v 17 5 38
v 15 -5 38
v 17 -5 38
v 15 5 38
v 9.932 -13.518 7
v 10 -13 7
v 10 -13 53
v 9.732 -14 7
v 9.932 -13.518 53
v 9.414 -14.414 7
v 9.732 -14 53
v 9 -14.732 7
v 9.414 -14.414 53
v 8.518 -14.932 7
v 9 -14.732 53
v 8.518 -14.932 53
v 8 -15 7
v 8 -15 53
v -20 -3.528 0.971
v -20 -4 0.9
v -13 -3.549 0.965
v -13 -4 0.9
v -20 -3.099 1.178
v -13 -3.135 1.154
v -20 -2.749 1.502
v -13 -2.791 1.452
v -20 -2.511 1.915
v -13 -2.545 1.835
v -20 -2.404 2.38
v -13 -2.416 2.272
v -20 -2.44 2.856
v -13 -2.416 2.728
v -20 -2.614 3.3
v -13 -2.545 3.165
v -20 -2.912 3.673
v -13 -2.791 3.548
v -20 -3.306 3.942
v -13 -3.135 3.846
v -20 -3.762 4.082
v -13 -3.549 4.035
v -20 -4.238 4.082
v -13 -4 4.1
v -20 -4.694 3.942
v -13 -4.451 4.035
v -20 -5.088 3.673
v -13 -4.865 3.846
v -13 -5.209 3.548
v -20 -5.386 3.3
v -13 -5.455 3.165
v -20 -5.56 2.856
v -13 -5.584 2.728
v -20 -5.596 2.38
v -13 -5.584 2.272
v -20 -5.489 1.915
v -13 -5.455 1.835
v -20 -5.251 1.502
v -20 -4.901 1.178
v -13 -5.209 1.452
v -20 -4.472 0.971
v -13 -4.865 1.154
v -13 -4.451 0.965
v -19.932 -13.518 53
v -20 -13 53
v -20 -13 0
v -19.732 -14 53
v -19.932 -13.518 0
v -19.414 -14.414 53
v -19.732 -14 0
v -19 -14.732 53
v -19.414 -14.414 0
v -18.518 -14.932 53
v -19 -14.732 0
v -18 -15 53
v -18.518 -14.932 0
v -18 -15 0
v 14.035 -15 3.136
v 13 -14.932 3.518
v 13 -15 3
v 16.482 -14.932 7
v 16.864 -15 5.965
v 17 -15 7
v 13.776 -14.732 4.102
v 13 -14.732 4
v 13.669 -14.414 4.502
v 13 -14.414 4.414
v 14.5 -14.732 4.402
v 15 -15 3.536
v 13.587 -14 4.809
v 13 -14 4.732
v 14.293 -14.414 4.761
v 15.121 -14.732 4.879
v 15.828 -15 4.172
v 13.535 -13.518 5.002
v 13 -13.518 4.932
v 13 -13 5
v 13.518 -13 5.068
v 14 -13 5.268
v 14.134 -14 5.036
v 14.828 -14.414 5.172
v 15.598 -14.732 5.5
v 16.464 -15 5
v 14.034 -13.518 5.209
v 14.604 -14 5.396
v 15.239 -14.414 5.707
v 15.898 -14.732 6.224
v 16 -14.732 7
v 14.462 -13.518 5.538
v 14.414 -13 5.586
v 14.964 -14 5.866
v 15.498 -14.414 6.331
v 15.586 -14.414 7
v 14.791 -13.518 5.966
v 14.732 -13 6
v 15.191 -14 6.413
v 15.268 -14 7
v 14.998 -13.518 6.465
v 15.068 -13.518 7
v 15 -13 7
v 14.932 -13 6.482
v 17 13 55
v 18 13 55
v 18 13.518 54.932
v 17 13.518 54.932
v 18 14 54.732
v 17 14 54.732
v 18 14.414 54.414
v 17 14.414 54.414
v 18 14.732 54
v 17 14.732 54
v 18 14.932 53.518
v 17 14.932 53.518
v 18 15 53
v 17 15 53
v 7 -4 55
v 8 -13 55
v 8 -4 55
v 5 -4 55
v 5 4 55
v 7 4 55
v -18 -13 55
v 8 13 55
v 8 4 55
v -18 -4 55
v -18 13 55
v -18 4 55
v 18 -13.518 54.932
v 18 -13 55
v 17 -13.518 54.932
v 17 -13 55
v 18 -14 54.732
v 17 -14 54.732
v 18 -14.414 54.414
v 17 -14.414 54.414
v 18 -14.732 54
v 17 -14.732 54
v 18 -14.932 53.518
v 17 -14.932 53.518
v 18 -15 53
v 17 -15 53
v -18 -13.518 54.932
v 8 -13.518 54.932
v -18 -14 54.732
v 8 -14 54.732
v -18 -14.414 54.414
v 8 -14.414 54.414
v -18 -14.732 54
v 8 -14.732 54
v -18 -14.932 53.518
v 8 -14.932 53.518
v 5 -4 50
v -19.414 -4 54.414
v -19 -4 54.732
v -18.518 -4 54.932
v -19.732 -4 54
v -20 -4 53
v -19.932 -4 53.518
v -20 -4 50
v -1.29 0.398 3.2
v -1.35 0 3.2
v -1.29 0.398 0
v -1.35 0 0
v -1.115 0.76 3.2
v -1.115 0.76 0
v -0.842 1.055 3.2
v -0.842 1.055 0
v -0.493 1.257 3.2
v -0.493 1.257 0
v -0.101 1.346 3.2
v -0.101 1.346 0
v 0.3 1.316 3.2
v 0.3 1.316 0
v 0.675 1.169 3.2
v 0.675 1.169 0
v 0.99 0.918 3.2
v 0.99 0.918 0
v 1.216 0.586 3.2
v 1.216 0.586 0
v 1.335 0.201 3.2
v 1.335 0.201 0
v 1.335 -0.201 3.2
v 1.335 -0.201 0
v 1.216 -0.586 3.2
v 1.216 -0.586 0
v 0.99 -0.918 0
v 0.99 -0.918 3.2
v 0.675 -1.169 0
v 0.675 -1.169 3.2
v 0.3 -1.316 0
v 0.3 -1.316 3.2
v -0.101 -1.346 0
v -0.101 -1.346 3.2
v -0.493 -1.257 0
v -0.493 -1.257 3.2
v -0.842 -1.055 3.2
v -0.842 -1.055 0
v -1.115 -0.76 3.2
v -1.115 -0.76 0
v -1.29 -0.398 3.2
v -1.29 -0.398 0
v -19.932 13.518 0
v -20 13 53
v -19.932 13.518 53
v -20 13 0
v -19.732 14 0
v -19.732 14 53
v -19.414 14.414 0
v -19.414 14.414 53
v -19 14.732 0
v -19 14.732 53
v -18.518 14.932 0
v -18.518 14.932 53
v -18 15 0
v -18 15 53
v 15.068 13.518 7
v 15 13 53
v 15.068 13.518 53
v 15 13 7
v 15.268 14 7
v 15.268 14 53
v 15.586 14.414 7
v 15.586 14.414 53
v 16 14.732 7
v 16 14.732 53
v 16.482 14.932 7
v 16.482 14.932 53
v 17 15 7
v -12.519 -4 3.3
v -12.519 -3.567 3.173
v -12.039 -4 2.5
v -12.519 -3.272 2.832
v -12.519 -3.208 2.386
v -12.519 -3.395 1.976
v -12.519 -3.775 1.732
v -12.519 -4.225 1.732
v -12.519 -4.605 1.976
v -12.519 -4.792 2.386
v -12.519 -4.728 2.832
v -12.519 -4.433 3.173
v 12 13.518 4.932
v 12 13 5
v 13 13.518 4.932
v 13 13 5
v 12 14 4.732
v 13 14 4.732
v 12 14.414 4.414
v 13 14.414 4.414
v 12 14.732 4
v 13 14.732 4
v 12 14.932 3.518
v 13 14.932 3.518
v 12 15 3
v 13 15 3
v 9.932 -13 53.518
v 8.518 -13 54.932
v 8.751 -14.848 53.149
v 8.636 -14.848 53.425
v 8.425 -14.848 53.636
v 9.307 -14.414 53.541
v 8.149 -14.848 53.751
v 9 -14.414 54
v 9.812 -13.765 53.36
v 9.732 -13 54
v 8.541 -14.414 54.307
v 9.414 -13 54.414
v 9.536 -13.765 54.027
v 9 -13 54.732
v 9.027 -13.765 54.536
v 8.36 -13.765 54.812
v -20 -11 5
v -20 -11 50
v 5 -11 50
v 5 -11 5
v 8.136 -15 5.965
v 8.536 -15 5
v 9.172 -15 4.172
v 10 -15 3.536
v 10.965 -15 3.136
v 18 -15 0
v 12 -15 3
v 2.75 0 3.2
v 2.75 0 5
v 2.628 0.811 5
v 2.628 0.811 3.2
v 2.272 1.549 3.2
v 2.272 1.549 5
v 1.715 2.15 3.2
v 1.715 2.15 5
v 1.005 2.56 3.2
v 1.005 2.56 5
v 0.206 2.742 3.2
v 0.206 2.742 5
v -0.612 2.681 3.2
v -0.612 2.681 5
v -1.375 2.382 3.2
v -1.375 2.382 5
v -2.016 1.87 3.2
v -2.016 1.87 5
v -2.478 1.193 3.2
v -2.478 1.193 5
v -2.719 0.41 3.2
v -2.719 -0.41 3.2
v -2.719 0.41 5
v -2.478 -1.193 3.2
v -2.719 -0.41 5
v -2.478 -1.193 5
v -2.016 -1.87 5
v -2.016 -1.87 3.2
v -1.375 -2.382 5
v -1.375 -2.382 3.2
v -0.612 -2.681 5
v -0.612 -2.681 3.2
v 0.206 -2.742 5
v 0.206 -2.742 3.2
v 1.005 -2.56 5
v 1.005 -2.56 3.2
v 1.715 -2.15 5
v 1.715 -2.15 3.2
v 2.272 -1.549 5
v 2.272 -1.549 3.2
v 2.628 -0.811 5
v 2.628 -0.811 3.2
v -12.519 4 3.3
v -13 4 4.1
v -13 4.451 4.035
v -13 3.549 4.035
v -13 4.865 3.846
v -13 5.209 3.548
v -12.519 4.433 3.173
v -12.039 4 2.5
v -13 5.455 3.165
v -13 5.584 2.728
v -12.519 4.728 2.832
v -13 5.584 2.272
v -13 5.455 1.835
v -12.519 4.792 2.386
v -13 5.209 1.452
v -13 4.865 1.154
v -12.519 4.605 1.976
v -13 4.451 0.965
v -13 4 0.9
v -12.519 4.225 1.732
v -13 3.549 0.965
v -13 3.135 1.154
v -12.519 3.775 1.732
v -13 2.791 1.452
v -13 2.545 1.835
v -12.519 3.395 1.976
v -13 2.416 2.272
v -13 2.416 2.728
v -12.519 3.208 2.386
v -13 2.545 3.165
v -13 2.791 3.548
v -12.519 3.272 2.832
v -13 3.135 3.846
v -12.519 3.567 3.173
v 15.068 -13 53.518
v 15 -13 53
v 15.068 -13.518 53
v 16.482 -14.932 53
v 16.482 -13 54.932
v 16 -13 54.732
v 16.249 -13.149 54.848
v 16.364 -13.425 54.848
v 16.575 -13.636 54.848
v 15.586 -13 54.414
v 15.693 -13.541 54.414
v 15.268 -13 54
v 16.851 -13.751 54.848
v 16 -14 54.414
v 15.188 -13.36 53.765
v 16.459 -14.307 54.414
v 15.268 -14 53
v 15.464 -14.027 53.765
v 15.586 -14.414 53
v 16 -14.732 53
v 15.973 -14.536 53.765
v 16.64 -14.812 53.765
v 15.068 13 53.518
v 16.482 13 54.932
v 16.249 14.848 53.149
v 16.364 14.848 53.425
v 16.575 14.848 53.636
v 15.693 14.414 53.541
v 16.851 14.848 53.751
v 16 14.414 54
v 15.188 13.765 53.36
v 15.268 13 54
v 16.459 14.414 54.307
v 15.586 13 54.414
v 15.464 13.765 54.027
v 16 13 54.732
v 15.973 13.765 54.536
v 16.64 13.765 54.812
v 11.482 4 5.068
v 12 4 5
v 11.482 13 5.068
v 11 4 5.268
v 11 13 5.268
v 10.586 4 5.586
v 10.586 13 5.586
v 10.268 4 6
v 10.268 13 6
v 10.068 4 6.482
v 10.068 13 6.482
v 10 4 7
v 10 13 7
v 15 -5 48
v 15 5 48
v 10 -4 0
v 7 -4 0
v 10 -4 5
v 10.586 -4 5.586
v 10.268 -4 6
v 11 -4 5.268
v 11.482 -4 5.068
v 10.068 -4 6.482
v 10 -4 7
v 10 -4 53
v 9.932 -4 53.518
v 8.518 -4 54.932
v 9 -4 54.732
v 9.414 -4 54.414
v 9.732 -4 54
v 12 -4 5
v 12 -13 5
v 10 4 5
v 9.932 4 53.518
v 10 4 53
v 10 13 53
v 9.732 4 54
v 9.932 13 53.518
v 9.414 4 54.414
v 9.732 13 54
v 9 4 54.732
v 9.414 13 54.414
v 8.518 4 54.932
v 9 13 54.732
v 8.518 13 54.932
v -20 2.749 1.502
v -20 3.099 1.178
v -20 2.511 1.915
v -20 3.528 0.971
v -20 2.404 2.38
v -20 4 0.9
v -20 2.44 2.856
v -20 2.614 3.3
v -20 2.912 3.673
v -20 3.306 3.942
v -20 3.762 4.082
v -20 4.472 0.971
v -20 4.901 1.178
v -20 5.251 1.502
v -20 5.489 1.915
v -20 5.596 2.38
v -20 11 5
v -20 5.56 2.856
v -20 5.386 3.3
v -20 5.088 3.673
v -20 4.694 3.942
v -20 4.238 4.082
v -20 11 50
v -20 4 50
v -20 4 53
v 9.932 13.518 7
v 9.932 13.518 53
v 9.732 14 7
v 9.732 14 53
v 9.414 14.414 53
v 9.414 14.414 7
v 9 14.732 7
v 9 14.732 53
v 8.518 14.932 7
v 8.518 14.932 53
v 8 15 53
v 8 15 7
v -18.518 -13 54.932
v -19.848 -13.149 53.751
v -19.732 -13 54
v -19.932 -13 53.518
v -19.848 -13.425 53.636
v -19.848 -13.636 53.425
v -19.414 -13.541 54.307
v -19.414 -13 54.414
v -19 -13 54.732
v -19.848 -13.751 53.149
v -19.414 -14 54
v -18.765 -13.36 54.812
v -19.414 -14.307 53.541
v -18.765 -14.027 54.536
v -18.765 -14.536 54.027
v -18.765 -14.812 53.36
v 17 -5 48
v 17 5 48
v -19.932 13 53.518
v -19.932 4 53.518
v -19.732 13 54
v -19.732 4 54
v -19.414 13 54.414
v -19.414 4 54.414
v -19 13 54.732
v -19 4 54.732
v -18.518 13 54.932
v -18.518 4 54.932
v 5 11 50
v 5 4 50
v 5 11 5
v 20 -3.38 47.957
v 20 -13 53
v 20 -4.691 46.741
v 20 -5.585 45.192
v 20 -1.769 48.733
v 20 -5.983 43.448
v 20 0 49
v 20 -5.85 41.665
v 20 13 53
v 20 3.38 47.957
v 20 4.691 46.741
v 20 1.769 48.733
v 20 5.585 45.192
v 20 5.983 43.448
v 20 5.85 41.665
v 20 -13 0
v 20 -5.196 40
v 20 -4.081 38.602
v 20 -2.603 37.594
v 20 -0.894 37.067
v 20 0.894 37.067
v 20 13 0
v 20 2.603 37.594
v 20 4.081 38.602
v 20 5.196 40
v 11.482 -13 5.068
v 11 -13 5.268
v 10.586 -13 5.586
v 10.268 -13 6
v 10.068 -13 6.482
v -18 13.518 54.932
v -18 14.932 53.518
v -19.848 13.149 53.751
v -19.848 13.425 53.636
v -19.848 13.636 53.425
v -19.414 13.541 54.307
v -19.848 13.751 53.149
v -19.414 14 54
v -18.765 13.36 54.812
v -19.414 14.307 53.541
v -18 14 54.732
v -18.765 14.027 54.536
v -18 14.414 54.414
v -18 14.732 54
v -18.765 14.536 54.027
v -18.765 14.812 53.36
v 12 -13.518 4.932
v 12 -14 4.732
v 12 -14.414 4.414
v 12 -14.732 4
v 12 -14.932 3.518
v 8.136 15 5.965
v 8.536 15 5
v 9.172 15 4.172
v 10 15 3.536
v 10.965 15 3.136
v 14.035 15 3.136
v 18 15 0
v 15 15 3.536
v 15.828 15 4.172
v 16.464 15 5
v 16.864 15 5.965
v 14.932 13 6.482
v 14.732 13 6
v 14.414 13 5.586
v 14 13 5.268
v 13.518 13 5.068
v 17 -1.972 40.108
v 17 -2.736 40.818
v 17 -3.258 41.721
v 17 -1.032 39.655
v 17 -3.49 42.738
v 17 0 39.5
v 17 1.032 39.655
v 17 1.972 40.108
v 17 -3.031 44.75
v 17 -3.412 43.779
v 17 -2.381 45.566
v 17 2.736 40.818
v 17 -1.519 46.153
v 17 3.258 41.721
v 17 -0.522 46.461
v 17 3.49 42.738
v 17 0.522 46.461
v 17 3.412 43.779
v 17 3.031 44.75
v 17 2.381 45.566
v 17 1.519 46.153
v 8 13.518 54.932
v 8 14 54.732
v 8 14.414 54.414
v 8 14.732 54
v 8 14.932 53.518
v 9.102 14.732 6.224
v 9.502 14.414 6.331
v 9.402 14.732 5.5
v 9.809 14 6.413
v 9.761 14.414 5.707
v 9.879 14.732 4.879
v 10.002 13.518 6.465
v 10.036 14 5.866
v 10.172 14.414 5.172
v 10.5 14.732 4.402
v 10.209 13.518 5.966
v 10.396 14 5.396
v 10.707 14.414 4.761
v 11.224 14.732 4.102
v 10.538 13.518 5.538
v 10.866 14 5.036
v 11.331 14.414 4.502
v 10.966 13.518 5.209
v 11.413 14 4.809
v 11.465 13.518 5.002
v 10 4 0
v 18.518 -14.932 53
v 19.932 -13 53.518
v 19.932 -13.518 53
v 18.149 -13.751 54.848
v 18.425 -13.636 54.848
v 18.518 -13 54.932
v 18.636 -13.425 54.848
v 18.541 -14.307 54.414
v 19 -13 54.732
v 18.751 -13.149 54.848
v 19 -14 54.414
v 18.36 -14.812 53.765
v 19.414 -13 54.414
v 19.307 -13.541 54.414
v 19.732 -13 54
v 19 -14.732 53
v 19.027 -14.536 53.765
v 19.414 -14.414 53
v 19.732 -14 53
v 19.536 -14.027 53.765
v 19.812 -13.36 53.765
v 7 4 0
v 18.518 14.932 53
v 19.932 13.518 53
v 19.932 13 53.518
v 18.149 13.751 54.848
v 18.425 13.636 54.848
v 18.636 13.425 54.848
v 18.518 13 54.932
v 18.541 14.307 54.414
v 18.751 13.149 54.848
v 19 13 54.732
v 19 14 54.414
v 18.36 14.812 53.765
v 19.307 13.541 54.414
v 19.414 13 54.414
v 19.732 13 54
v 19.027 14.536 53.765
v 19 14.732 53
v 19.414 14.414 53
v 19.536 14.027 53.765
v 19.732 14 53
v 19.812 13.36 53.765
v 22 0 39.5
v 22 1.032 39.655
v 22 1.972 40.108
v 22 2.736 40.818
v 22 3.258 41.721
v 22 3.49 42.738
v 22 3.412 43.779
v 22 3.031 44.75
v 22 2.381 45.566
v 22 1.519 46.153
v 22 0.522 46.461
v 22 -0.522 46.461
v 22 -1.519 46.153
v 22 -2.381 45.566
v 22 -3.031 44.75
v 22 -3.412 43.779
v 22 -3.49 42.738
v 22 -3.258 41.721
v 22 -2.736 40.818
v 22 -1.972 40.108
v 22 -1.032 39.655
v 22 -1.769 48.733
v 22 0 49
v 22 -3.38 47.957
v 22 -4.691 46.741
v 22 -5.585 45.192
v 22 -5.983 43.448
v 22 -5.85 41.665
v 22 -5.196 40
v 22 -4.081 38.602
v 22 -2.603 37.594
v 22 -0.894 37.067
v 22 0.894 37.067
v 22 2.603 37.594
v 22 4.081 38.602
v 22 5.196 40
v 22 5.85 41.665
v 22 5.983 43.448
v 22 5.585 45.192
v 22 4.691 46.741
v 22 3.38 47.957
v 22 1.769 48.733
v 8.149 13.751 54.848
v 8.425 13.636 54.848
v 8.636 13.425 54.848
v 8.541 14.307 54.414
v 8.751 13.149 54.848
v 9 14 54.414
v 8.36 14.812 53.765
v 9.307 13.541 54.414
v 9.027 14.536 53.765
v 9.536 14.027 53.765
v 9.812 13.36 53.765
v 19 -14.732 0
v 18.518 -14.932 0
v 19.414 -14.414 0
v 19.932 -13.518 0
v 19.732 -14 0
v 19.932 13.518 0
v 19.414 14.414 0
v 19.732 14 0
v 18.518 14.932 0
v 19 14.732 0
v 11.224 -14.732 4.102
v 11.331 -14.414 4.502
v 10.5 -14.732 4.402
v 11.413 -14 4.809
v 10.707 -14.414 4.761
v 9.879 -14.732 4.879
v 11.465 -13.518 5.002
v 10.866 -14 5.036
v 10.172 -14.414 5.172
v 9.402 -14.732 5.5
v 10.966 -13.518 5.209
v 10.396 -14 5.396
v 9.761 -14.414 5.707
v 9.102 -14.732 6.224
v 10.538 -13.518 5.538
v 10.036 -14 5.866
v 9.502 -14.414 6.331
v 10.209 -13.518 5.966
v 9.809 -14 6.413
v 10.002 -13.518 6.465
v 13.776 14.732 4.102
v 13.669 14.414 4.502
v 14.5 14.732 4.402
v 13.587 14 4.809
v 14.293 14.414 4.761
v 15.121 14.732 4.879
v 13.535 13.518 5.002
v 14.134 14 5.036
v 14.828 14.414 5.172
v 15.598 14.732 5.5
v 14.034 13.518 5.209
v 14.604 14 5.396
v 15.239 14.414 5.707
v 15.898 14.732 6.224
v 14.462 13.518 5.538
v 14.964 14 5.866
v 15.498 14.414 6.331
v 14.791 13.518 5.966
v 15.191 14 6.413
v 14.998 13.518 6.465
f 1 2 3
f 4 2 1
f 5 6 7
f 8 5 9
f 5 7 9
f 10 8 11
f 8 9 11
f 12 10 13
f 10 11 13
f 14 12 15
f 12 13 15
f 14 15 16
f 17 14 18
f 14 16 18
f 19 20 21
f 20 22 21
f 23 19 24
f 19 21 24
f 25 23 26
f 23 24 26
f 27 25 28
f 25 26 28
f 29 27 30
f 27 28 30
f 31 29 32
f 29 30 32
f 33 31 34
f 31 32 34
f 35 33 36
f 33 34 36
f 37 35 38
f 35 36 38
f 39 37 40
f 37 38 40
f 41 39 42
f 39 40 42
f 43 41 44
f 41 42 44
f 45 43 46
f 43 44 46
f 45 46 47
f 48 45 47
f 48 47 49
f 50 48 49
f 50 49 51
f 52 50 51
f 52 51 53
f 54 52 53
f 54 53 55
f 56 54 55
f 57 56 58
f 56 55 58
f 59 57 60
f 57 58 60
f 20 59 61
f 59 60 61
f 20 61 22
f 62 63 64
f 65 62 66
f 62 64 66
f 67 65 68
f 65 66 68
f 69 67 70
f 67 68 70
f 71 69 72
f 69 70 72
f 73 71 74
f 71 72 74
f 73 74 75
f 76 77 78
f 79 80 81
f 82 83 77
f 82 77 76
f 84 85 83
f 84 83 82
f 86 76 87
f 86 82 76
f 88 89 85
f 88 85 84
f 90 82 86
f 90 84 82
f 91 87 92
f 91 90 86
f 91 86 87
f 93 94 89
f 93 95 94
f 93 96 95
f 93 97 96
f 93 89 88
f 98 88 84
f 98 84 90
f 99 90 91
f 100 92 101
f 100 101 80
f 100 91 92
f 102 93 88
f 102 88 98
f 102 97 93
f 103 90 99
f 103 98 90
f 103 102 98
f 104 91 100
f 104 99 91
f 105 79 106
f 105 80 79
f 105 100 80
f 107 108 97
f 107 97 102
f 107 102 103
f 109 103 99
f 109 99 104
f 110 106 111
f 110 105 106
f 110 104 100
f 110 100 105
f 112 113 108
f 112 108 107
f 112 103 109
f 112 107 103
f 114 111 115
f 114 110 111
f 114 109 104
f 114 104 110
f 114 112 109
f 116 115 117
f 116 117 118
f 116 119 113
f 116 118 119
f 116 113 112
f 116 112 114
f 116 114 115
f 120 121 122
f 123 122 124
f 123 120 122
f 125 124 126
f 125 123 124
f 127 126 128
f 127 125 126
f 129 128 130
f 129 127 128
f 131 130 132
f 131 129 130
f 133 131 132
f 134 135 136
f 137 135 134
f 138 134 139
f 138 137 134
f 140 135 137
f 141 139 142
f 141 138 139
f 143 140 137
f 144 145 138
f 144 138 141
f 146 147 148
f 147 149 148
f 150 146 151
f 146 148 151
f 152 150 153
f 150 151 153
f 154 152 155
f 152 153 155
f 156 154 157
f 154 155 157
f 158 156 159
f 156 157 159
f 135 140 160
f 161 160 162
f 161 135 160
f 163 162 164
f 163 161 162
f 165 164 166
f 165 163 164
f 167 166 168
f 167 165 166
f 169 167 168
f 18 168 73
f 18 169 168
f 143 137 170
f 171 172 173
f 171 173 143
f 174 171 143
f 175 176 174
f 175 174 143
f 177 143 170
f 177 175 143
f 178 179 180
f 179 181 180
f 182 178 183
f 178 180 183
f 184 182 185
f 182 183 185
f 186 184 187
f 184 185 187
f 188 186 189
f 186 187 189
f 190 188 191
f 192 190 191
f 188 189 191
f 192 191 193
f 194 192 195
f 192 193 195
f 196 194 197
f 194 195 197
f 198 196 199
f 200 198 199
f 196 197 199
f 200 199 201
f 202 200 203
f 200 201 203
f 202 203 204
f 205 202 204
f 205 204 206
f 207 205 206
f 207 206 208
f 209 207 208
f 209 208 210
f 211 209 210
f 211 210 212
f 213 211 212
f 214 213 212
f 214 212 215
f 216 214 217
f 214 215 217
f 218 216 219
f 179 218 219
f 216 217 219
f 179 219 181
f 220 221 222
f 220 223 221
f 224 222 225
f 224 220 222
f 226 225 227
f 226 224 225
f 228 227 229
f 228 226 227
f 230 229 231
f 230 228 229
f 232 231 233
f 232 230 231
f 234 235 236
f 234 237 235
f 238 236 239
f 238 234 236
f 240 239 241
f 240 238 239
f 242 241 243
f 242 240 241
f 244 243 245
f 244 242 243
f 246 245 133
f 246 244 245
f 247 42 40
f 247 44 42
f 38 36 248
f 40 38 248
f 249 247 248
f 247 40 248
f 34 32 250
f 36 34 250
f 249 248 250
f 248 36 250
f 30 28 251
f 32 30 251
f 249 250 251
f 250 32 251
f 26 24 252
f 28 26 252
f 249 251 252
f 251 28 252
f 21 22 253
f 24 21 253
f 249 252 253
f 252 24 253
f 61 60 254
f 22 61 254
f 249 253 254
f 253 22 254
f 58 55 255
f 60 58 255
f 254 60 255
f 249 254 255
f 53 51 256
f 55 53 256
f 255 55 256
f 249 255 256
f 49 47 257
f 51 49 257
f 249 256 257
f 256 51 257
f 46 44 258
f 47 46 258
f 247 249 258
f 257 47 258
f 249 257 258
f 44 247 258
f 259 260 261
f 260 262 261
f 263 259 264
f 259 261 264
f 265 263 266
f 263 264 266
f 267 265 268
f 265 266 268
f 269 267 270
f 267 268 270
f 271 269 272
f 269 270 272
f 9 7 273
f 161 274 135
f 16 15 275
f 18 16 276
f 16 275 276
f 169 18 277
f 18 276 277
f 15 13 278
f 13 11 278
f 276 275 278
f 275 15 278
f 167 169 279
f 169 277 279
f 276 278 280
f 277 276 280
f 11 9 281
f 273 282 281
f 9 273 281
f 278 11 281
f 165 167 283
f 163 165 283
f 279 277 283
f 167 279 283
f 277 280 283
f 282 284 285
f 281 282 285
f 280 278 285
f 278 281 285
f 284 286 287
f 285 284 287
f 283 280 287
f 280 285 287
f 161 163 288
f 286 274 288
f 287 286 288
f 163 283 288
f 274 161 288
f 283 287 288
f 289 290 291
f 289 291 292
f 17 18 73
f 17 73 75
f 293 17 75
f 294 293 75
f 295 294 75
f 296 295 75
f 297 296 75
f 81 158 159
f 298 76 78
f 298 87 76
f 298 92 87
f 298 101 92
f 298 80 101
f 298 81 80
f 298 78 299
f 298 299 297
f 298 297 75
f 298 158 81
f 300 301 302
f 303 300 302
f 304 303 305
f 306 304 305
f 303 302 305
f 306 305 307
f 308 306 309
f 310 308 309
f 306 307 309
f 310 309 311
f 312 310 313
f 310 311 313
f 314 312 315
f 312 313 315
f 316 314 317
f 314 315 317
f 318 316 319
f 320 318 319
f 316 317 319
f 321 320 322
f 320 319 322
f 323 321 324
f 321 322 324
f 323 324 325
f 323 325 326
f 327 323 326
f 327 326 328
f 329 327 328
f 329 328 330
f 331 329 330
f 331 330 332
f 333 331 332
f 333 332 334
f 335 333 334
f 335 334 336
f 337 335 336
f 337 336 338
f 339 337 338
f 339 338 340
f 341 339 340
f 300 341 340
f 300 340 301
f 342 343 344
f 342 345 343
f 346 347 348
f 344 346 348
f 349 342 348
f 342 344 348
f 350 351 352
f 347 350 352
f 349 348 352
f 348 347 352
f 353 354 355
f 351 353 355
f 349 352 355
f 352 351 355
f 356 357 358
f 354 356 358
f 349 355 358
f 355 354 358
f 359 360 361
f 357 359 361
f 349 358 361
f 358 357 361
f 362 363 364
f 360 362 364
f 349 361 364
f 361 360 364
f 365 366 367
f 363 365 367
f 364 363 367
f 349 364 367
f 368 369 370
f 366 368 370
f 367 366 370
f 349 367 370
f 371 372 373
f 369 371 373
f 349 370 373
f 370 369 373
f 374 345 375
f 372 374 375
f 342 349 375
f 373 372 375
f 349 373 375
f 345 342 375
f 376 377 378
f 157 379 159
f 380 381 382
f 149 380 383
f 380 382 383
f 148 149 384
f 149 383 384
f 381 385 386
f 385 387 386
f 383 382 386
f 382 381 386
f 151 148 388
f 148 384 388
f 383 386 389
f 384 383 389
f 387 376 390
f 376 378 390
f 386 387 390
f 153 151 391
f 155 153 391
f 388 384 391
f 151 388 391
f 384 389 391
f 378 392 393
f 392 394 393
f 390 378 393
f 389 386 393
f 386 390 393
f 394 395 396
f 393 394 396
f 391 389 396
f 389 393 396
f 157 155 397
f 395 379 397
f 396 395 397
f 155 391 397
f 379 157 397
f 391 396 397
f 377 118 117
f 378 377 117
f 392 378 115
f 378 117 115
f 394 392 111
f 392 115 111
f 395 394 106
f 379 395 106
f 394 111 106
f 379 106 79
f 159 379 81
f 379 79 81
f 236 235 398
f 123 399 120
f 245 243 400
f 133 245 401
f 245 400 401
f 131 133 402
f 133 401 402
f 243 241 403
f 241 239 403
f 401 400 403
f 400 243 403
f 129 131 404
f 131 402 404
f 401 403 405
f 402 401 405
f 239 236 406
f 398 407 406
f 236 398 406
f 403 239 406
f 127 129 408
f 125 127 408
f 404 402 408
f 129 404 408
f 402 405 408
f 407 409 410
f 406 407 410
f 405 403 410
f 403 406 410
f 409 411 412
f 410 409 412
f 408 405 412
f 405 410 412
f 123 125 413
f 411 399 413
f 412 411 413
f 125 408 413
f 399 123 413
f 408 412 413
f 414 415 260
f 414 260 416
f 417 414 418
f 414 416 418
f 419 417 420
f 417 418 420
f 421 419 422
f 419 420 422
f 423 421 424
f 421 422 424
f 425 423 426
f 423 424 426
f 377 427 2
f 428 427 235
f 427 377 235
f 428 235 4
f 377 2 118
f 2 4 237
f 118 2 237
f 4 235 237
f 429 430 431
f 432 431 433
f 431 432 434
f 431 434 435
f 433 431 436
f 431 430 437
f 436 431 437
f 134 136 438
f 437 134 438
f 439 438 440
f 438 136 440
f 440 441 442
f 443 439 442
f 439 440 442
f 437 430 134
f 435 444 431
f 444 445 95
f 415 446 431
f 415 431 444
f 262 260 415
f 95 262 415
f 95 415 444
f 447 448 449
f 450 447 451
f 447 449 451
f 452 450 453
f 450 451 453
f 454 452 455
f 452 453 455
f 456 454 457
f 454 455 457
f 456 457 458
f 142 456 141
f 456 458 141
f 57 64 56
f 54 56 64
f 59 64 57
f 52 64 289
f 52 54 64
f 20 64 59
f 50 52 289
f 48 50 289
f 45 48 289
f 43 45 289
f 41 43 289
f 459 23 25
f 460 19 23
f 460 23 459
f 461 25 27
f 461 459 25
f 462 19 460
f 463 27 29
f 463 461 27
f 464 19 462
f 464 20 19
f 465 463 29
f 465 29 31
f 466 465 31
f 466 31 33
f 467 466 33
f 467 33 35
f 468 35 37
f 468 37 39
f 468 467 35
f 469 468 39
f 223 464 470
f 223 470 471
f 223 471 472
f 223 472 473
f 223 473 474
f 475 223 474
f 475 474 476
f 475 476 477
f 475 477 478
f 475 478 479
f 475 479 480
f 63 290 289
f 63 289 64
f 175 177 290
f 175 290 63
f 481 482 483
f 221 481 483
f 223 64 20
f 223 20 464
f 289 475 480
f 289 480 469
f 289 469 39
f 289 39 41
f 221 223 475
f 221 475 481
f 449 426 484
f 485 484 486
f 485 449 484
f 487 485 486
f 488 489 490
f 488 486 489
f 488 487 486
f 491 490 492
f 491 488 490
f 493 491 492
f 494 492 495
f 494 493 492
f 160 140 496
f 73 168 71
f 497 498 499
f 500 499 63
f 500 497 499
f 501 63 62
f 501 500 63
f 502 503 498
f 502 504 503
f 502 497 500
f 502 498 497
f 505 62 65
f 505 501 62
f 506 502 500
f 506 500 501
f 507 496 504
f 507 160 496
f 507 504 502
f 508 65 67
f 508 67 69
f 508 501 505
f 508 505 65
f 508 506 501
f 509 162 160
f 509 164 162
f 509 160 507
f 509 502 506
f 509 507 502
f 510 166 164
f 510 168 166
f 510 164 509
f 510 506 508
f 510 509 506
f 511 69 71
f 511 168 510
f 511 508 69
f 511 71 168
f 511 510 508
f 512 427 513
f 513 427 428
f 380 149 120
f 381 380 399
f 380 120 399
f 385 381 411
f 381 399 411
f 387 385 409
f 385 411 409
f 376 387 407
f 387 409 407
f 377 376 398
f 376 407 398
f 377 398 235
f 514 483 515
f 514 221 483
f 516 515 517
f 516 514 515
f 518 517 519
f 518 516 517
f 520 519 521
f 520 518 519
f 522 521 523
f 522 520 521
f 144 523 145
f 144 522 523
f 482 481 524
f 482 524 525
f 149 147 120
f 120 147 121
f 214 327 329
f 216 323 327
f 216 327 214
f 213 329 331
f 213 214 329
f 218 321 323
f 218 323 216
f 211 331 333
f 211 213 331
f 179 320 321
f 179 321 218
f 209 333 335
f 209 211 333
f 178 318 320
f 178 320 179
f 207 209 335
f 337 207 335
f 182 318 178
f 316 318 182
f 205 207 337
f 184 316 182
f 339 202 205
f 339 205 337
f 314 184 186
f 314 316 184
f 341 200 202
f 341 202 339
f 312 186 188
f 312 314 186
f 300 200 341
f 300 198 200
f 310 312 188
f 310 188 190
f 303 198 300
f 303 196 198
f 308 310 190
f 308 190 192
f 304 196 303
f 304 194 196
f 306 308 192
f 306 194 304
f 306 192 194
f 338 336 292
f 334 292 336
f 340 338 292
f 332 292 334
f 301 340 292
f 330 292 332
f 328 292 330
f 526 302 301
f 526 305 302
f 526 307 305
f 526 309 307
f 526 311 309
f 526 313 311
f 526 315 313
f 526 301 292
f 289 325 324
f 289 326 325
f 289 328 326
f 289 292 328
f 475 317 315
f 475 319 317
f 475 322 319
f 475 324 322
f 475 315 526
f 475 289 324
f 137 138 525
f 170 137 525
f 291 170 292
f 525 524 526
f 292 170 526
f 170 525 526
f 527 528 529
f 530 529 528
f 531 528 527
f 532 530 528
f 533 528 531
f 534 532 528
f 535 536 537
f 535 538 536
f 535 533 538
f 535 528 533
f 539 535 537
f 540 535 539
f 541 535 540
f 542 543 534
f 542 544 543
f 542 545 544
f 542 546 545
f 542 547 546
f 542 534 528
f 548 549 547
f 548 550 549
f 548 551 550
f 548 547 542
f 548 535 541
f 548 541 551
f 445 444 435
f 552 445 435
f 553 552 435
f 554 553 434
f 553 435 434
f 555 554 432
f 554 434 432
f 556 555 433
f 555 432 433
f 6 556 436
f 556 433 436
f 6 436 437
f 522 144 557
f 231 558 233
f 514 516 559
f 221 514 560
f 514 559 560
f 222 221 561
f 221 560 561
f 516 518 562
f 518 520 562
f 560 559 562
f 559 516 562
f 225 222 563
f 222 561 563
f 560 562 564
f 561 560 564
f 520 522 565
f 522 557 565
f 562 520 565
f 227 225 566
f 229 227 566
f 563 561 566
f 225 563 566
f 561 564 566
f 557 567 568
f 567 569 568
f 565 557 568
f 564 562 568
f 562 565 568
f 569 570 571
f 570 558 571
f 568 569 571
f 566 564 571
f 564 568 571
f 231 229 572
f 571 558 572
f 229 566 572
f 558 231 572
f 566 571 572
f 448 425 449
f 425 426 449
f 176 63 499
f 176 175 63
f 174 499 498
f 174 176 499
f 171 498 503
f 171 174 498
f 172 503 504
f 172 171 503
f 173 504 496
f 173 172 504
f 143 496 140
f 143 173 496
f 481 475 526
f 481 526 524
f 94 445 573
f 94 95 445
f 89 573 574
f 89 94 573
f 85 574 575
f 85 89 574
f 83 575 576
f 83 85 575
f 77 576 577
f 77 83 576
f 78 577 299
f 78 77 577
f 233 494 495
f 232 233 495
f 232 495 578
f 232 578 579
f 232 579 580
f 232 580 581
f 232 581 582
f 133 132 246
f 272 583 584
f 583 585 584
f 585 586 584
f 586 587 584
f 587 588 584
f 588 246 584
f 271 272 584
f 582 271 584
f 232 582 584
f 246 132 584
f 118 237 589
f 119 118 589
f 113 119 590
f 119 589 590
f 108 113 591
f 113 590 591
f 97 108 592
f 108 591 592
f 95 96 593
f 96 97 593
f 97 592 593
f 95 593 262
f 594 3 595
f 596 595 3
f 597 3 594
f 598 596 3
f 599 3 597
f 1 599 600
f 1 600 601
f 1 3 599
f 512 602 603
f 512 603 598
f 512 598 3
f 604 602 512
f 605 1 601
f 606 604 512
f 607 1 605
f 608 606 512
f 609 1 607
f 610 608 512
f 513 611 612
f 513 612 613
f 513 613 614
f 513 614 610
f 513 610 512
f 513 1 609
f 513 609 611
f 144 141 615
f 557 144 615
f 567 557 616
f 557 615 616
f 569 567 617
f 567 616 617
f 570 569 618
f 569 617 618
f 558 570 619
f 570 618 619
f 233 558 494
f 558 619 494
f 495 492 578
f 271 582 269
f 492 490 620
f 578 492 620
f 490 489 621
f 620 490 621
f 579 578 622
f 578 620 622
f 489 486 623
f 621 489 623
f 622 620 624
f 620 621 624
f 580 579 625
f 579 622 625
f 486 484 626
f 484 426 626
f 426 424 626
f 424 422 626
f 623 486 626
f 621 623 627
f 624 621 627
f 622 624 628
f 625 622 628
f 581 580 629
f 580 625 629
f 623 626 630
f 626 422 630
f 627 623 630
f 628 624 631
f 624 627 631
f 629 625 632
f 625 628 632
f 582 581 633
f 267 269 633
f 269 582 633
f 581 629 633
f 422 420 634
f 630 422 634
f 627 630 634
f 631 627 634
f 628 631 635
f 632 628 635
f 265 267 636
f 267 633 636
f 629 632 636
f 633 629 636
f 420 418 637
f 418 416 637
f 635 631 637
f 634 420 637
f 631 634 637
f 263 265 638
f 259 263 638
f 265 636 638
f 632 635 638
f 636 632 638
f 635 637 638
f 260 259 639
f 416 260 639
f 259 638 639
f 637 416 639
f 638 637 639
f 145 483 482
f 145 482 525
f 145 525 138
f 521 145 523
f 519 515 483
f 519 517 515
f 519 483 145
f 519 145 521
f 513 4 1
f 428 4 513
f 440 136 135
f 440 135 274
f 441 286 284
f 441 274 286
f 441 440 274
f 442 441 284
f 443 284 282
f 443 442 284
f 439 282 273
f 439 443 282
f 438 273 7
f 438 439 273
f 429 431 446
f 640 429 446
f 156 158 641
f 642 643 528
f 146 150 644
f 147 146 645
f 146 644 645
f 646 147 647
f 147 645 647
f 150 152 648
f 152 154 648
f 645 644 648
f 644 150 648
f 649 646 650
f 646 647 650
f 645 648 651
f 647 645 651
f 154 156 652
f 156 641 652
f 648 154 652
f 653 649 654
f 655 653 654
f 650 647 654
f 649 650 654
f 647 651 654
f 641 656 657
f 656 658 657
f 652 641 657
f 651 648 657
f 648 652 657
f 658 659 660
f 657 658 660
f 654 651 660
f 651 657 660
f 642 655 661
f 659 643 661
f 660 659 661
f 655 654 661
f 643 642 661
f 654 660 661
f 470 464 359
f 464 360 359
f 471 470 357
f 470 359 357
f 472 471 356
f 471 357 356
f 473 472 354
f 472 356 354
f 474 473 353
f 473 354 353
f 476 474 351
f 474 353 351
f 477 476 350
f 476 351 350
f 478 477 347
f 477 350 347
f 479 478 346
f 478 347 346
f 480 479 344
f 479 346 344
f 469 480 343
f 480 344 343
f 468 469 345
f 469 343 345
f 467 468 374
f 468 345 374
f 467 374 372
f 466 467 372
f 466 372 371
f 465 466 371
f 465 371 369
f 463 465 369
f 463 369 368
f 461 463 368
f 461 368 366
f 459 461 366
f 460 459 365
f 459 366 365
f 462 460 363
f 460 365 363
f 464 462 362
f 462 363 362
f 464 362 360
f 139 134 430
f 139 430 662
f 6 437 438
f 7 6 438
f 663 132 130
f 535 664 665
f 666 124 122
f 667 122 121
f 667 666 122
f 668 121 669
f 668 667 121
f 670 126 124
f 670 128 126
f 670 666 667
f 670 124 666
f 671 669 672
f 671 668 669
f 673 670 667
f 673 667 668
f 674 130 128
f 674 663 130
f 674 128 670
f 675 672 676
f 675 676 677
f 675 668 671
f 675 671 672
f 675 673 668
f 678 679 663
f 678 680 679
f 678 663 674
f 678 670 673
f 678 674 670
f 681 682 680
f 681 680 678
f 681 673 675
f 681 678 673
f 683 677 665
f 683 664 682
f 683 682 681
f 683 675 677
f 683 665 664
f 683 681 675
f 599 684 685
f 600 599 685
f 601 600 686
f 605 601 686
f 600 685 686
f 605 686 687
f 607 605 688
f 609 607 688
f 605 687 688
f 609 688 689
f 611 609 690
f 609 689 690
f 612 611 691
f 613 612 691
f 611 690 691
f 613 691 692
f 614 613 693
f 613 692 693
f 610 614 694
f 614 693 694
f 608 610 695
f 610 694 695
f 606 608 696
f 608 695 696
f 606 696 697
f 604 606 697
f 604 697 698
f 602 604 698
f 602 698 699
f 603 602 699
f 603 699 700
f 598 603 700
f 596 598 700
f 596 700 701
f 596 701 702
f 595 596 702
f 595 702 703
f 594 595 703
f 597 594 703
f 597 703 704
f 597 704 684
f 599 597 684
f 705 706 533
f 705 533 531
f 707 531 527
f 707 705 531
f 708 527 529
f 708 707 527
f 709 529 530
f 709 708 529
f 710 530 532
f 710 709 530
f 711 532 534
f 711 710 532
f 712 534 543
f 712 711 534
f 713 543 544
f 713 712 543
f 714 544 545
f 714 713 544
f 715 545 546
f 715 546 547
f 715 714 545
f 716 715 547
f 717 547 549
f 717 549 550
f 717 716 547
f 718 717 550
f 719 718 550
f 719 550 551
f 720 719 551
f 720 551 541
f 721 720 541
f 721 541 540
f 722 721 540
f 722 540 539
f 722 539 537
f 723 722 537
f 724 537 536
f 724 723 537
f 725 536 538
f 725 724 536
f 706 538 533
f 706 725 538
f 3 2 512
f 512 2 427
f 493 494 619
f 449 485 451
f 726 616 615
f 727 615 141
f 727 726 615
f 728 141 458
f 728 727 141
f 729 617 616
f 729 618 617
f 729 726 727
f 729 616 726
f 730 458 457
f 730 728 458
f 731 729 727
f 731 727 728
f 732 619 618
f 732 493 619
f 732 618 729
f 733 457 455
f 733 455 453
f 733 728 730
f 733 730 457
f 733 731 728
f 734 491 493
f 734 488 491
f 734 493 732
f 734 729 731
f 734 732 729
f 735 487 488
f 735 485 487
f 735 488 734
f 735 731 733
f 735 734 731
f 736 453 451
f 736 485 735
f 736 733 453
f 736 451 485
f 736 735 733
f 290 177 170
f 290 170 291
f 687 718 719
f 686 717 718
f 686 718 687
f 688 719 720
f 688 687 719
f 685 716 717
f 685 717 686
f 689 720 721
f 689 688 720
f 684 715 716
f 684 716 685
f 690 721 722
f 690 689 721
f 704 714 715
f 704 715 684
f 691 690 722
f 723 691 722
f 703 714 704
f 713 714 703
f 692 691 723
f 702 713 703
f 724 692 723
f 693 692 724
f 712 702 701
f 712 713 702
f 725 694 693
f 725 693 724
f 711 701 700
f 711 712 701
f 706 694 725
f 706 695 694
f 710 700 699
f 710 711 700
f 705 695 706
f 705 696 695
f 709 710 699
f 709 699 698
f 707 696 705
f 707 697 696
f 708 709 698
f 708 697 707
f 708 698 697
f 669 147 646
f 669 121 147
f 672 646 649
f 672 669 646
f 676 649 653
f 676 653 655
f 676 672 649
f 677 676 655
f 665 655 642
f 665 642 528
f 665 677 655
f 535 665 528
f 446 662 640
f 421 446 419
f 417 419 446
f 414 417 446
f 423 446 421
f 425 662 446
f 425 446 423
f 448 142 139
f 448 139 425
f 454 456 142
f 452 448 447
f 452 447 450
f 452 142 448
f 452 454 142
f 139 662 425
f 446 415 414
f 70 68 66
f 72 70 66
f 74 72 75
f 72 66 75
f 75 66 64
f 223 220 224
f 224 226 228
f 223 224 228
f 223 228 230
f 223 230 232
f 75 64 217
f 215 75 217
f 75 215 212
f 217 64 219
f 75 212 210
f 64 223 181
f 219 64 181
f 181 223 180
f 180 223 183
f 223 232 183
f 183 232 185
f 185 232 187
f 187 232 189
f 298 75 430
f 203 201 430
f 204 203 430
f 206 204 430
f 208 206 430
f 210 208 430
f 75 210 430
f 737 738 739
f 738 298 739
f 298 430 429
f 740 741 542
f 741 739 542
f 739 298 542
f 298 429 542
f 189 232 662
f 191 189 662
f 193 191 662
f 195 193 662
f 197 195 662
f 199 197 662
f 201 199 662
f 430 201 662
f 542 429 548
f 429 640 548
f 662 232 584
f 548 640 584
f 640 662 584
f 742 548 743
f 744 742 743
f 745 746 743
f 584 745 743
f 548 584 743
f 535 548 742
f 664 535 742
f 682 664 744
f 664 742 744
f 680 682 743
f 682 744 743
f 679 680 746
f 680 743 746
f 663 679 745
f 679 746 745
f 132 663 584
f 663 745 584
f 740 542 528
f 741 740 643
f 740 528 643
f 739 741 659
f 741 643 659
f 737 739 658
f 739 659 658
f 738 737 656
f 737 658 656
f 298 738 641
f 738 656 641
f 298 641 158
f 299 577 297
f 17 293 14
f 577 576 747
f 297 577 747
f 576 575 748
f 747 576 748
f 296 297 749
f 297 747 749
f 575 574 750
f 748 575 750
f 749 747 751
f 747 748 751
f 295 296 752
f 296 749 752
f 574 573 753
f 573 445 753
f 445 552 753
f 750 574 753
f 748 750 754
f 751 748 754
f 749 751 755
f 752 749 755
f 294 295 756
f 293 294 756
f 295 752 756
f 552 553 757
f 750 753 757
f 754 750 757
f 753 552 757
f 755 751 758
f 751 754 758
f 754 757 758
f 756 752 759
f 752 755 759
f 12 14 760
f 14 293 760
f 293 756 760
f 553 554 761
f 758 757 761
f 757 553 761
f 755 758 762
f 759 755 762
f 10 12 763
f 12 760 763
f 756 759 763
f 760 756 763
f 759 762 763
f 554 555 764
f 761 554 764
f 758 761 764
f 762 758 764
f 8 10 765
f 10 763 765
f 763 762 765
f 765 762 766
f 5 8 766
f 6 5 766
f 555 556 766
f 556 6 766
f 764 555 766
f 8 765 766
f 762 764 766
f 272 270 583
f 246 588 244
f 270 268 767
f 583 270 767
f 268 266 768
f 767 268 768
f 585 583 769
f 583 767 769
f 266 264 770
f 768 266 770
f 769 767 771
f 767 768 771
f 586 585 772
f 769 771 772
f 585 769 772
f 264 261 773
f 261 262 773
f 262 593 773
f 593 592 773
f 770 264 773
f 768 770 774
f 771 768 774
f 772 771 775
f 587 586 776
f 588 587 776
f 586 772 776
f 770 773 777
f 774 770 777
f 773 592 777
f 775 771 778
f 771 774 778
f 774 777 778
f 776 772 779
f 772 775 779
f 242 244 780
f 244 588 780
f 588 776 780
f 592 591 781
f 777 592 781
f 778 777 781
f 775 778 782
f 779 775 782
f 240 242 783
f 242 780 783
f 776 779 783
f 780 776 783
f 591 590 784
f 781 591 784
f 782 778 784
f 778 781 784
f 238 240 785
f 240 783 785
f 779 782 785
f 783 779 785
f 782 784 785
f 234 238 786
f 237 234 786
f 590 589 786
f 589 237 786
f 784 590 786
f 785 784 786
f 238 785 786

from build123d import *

# Parameters (mm, degrees)
ESQUISSE1_W                                          = 40
ESQUISSE1_H                                          = 30
BOSS_EXTRU_1_DEPTH                                   = 5
ESQUISSE5_W                                          = 50
ESQUISSE5_H                                          = 30
BOSS_EXTRU_3_DEPTH                                   = 30
ENL_V_MAT_EXTRU_1_DEPTH                              = 25
CHAMBRAGE_POUR_T_TE_CYLINDRIQUE_FENDUE_M_D           = 2.7
CHAMBRAGE_POUR_T_TE_CYLINDRIQUE_FENDUE_M_DEPTH       = 7
CHAMBRAGE_POUR_T_TE_CYLINDRIQUE_FENDUE_M_CBORE_D     = 5.5
CHAMBRAGE_POUR_T_TE_CYLINDRIQUE_FENDUE_M_CBORE_DEPTH = 1.8
CHAMBRAGE_POUR_T_TE_CYLINDRIQUE_FENDUE_M_TIP         = 0.811161836
ESQUISSE14_W                                         = 3
ESQUISSE14_H                                         = 8
ENL_V_MAT_EXTRU_2_DEPTH                              = 61.415229868
D_GAGEMENT_M31_D                                     = 3.2
D_GAGEMENT_M31_DEPTH                                 = 7
D_GAGEMENT_M31_TIP                                   = 0.96137699
ESQUISSE16_W                                         = 50
ESQUISSE16_H                                         = 30
ESQUISSE16_R                                         = 3.5
BOSS_EXTRU_4_DEPTH                                   = 5
CONG_1_R                                             = 2
ESQUISSE17_W                                         = 10
ESQUISSE17_H                                         = 10
ENL_V_MAT_EXTRU_3_DEPTH                              = 2
BOSS_EXTRU_5_START                                   = 2
ESQUISSE18_R                                         = 6
ESQUISSE18_R_2                                       = 3.5
BOSS_EXTRU_5_DEPTH                                   = 2


with BuildPart() as part:
    # Esquisse1 → Boss.-Extru.1 (new body)
    with BuildSketch(Plane.XY):
        Rectangle(ESQUISSE1_W, ESQUISSE1_H)
    extrude(amount=BOSS_EXTRU_1_DEPTH)

    # Esquisse5 → Boss.-Extru.3 (add)
    with BuildSketch(Plane.ZY.offset(20)):
        with Locations((30, 0)):
            Rectangle(ESQUISSE5_W, ESQUISSE5_H)
    extrude(amount=-BOSS_EXTRU_3_DEPTH)

    # Esquisse6 → Enlèv. mat.-Extru.1 (cut)
    with BuildSketch(Plane.ZY.offset(20)):
        Polygon((50, 11), (50, 4), (55, 4), (55, -4), (50, -4), (50, -11), (5, -11), (5, 11), align=None)
    extrude(amount=-ENL_V_MAT_EXTRU_1_DEPTH, mode=Mode.SUBTRACT)

    # Chambrage pour tête cylindrique fendue M2.51
    with Locations(Plane.XY.offset(5)):
        with Locations((0, 0)):
            CounterBoreHole(CHAMBRAGE_POUR_T_TE_CYLINDRIQUE_FENDUE_M_D / 2, CHAMBRAGE_POUR_T_TE_CYLINDRIQUE_FENDUE_M_CBORE_D / 2, CHAMBRAGE_POUR_T_TE_CYLINDRIQUE_FENDUE_M_CBORE_DEPTH, depth=CHAMBRAGE_POUR_T_TE_CYLINDRIQUE_FENDUE_M_DEPTH)
            with Locations((0, 0, -(CHAMBRAGE_POUR_T_TE_CYLINDRIQUE_FENDUE_M_DEPTH + CHAMBRAGE_POUR_T_TE_CYLINDRIQUE_FENDUE_M_TIP / 2))):  # 118° drill point
                Cone(0, CHAMBRAGE_POUR_T_TE_CYLINDRIQUE_FENDUE_M_D / 2, CHAMBRAGE_POUR_T_TE_CYLINDRIQUE_FENDUE_M_TIP, mode=Mode.SUBTRACT)

    # Esquisse14 → Enlèv. mat.-Extru.2 (cut, through all)
    with BuildSketch(Plane.XY.offset(55)):
        with Locations((8.5, 0)):
            Rectangle(ESQUISSE14_W, ESQUISSE14_H)
    extrude(amount=-ENL_V_MAT_EXTRU_2_DEPTH, mode=Mode.SUBTRACT)

    # Dégagement M31
    with Locations(Plane.ZY.offset(20)):
        with Locations((2.5, -4), (2.5, 4)):
            Hole(D_GAGEMENT_M31_D / 2, depth=D_GAGEMENT_M31_DEPTH)
            with Locations((0, 0, -(D_GAGEMENT_M31_DEPTH + D_GAGEMENT_M31_TIP / 2))):  # 118° drill point
                Cone(0, D_GAGEMENT_M31_D / 2, D_GAGEMENT_M31_TIP, mode=Mode.SUBTRACT)

    # Esquisse16 → Boss.-Extru.4 (add)
    with BuildSketch(Plane(origin=(20, 0, 0), x_dir=(0, 0, -1), z_dir=(1, 0, 0))):
        with Locations((-30, 0)):
            Rectangle(ESQUISSE16_W, ESQUISSE16_H)
        with Locations((-43, 0)):
            Circle(ESQUISSE16_R, mode=Mode.SUBTRACT)
    extrude(amount=-BOSS_EXTRU_4_DEPTH)

    # Congé1
    cong_1_edges = [part.edges().sort_by_distance(p)[0] for p in [
        (12.5, -15, 5),
        (10, 9.5, 5),
        (10, 15, 30),
        (10, -9.5, 55),
        (-5, 15, 55),
        (10, -15, 30),
        (-5, -15, 55),
        (-20, -9.5, 55),
        (-20, 9.5, 55),
        (10, -9.5, 5),
        (10, 9.5, 55),
        (20, -15, 27.5),
        (-20, -15, 27.5),
        (-20, 15, 27.5),
        (20, 15, 27.5),
        (12.5, 15, 5),
        (15, -15, 30),
        (15, 0, 55),
        (17.5, -15, 55),
        (15, 15, 30),
        (17.5, 15, 55),
        (15, 0, 5),
        (20, 0, 55),
    ]]
    fillet(cong_1_edges, radius=CONG_1_R)

    # Esquisse17 → Enlèv. mat.-Extru.3 (cut)
    with BuildSketch(Plane.ZY.offset(-15)):
        with Locations((43, 0)):
            Rectangle(ESQUISSE17_W, ESQUISSE17_H)
    extrude(amount=-ENL_V_MAT_EXTRU_3_DEPTH, mode=Mode.SUBTRACT)

    # Esquisse18 → Boss.-Extru.5 (add)
    with BuildSketch(Plane(origin=(20, 0, 0), x_dir=(0, 0, -1), z_dir=(1, 0, 0)).offset(BOSS_EXTRU_5_START)):
        with Locations(Location((-43, 0, 0), (0, 0, 180))):
            Circle(ESQUISSE18_R)
        with Locations((-43, 0)):
            Circle(ESQUISSE18_R_2, mode=Mode.SUBTRACT)
    extrude(amount=-BOSS_EXTRU_5_DEPTH)


solid = part.part
